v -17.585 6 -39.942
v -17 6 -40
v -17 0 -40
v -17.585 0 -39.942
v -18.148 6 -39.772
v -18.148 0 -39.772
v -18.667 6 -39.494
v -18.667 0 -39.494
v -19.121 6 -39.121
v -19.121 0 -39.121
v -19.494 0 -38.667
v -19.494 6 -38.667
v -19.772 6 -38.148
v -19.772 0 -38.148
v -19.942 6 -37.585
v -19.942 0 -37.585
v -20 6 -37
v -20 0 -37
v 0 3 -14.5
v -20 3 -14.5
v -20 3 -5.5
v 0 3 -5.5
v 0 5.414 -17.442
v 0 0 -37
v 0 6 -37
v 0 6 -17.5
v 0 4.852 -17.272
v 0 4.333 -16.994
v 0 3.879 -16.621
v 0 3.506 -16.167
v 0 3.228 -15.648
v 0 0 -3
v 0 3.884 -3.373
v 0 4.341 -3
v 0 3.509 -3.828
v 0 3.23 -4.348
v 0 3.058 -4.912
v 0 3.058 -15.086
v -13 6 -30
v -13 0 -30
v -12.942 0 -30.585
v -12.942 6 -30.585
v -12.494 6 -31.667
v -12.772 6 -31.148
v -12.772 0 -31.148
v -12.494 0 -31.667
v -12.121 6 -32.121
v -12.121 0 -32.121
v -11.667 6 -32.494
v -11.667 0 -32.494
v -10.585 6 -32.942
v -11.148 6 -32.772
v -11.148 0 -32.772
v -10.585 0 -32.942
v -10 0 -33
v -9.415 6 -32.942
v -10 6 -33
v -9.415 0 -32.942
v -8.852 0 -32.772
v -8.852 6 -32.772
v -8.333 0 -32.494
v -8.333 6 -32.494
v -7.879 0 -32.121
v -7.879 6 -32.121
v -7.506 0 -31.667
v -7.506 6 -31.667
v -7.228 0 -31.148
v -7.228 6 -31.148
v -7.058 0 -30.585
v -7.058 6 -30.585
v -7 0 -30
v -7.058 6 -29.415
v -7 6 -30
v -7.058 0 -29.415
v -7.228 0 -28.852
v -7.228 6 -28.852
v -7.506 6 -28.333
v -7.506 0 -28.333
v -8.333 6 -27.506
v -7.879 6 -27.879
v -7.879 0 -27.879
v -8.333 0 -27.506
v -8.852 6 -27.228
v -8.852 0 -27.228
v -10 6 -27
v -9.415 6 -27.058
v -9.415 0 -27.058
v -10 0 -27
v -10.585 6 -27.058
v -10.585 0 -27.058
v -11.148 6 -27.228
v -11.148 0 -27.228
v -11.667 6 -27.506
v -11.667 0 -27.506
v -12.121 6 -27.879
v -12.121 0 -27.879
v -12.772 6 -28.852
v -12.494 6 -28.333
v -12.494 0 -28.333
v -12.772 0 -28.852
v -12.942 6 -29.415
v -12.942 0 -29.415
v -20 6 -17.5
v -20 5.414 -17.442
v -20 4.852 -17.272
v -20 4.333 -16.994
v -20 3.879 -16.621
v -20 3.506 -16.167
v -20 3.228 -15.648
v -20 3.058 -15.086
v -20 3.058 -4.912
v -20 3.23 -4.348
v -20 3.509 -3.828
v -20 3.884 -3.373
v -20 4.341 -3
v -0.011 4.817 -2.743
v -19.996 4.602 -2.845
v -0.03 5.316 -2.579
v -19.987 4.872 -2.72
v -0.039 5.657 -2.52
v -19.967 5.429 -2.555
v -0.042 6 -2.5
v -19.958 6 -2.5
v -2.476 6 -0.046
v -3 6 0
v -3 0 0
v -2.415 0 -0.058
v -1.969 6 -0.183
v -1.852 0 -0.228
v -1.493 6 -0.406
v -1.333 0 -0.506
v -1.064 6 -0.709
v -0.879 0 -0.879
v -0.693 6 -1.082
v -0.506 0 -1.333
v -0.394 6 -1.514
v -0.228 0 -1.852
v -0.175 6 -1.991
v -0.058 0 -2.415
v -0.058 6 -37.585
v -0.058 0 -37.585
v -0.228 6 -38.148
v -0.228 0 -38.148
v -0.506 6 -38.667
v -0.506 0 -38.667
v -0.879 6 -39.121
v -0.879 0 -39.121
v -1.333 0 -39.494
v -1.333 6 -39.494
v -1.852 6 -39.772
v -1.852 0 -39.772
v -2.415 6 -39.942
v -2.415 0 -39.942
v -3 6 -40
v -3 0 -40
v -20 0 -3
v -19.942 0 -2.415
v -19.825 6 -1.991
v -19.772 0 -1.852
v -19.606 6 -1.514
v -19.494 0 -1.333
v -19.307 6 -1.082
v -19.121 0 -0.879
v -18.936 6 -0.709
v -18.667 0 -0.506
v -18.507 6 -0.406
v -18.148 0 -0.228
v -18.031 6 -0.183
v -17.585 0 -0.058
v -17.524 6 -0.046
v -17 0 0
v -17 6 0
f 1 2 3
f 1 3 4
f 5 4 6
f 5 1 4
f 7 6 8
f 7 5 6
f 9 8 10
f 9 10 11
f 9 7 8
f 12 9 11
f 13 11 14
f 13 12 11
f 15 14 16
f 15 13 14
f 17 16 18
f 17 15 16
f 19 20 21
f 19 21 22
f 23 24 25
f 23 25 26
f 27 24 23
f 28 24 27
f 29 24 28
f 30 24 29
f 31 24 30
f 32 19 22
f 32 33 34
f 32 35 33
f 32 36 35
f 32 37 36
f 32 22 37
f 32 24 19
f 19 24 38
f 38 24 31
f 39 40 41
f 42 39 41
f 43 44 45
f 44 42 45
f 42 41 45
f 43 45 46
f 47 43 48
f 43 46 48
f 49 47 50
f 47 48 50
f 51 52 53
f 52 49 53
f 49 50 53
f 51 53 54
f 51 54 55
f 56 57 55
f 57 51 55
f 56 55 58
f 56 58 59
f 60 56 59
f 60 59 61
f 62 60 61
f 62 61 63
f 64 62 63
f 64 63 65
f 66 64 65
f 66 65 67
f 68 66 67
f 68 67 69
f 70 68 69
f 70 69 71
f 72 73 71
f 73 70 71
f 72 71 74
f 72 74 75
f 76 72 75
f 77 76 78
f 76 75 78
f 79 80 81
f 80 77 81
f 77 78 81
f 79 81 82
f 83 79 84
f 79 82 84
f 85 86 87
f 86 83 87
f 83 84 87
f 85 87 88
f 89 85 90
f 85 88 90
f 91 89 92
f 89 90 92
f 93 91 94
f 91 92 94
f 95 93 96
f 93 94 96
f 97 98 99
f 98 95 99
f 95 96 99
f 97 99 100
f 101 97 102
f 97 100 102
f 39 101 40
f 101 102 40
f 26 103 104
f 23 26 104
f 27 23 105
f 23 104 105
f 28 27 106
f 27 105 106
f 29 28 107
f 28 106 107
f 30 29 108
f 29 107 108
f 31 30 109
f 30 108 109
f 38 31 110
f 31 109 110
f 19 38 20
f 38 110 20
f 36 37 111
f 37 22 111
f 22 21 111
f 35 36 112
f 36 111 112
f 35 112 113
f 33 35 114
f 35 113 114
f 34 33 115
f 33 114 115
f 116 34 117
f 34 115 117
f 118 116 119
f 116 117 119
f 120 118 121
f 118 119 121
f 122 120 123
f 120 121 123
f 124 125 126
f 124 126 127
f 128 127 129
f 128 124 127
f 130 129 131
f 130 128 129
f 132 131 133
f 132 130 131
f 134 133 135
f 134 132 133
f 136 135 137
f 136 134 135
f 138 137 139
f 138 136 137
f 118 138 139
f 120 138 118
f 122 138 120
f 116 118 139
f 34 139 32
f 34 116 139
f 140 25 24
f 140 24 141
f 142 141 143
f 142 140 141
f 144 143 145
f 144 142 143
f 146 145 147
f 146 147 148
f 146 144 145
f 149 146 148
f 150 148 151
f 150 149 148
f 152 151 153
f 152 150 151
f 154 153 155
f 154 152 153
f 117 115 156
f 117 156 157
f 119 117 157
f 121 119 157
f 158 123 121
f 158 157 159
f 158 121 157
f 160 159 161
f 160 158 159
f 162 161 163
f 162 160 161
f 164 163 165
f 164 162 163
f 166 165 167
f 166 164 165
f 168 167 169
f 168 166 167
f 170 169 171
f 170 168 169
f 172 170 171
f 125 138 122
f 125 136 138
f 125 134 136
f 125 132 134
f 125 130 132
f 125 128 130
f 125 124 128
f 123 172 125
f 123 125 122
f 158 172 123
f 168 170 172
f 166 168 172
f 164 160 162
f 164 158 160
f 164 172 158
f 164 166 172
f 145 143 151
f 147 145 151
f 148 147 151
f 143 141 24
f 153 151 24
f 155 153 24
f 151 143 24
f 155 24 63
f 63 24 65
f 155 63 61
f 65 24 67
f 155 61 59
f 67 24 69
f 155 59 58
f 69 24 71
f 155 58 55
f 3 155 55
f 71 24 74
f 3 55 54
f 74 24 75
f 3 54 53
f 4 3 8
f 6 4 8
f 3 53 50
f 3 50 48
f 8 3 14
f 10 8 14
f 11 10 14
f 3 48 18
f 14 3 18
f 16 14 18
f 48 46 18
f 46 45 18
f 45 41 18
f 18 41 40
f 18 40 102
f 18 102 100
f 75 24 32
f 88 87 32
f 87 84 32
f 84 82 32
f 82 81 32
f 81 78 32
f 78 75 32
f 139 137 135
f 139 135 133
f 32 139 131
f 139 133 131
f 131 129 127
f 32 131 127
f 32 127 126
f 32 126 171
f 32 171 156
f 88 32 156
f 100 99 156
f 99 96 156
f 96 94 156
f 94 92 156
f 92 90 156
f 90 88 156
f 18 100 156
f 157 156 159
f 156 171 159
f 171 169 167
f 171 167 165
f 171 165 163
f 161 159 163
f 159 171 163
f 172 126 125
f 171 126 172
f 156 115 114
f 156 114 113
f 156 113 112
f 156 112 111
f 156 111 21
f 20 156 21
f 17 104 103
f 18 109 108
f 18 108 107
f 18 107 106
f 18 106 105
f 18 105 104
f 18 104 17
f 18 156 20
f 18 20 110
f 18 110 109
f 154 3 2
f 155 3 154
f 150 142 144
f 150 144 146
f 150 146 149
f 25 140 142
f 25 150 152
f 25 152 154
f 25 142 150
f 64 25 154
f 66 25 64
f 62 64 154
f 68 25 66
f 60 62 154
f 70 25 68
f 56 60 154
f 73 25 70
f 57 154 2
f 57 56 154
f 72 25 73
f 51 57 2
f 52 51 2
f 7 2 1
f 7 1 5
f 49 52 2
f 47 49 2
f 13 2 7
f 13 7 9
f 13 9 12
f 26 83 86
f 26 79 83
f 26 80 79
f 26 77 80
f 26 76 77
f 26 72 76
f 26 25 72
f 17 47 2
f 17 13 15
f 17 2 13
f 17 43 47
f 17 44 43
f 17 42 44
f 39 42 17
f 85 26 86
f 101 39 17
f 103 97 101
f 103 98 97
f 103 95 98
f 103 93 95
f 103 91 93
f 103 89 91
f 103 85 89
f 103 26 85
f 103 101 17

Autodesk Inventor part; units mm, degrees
ref_plane "YZ Plane" through (0, 0, 0) normal (1, 0, 0) x (0, 1, 0)
ref_plane "XZ Plane" through (0, 0, 0) normal (0, 1, 0) x (-1, 0, 0)
ref_plane "XY Plane" through (0, 0, 0) normal (0, 0, 1) x (1, 0, 0)
sketch "Sketch1" plane through (0, 0, 0) normal (0, 1, 0) x (-1, 0, 0)
  line L0 (0, 0) -> (20, 0)
  line L1 (20, 0) -> (20, -40)
  line L2 (20, -40) -> (0, -40)
  line L3 (0, -40) -> (0, 0)
  circle A0 centre (10, -30) radius 3
  dimension "d0" = 20
  dimension "d1" = 40
  dimension "d2" = 6
  dimension "d3" = 10
  dimension "d4" = 10
extrude "Extrusion1" add sketch "Sketch1" along normal blind 6
sketch "Sketch2" plane through (0, 6, 0) normal (0, 1, 0) x (1, 0, 0)
  line L0 (-20, 0) -> (0, 0) projected
  line L1 (-10, 0) -> (-10, 10)
  line L2 (0, 17.5) -> (-20, 17.5)
  line L3 (-20, 17.5) -> (-20, 2.5)
  line L4 (-20, 2.5) -> (0, 2.5)
  line L5 (0, 2.5) -> (0, 17.5)
  line L6 (0, 17.5) -> (-20, 2.5) construction
  line L7 (-20, 17.5) -> (0, 2.5) construction
  dimension "d7" = 10
  dimension "d8" = 20
  dimension "d9" = 15
extrude "Extrusion2" cut sketch "Sketch2" against normal blind 3
fillet "Fillet1" radius 3 2 edges at (-10, 3, -17.5) (-10, 3, -2.5)
fillet "Fillet2" radius 3 4 edges at (-20, 3, -40) (0, 3, -40) (-20, 3, 0) (0, 3, 0)
properties part number "CableTieDown"
